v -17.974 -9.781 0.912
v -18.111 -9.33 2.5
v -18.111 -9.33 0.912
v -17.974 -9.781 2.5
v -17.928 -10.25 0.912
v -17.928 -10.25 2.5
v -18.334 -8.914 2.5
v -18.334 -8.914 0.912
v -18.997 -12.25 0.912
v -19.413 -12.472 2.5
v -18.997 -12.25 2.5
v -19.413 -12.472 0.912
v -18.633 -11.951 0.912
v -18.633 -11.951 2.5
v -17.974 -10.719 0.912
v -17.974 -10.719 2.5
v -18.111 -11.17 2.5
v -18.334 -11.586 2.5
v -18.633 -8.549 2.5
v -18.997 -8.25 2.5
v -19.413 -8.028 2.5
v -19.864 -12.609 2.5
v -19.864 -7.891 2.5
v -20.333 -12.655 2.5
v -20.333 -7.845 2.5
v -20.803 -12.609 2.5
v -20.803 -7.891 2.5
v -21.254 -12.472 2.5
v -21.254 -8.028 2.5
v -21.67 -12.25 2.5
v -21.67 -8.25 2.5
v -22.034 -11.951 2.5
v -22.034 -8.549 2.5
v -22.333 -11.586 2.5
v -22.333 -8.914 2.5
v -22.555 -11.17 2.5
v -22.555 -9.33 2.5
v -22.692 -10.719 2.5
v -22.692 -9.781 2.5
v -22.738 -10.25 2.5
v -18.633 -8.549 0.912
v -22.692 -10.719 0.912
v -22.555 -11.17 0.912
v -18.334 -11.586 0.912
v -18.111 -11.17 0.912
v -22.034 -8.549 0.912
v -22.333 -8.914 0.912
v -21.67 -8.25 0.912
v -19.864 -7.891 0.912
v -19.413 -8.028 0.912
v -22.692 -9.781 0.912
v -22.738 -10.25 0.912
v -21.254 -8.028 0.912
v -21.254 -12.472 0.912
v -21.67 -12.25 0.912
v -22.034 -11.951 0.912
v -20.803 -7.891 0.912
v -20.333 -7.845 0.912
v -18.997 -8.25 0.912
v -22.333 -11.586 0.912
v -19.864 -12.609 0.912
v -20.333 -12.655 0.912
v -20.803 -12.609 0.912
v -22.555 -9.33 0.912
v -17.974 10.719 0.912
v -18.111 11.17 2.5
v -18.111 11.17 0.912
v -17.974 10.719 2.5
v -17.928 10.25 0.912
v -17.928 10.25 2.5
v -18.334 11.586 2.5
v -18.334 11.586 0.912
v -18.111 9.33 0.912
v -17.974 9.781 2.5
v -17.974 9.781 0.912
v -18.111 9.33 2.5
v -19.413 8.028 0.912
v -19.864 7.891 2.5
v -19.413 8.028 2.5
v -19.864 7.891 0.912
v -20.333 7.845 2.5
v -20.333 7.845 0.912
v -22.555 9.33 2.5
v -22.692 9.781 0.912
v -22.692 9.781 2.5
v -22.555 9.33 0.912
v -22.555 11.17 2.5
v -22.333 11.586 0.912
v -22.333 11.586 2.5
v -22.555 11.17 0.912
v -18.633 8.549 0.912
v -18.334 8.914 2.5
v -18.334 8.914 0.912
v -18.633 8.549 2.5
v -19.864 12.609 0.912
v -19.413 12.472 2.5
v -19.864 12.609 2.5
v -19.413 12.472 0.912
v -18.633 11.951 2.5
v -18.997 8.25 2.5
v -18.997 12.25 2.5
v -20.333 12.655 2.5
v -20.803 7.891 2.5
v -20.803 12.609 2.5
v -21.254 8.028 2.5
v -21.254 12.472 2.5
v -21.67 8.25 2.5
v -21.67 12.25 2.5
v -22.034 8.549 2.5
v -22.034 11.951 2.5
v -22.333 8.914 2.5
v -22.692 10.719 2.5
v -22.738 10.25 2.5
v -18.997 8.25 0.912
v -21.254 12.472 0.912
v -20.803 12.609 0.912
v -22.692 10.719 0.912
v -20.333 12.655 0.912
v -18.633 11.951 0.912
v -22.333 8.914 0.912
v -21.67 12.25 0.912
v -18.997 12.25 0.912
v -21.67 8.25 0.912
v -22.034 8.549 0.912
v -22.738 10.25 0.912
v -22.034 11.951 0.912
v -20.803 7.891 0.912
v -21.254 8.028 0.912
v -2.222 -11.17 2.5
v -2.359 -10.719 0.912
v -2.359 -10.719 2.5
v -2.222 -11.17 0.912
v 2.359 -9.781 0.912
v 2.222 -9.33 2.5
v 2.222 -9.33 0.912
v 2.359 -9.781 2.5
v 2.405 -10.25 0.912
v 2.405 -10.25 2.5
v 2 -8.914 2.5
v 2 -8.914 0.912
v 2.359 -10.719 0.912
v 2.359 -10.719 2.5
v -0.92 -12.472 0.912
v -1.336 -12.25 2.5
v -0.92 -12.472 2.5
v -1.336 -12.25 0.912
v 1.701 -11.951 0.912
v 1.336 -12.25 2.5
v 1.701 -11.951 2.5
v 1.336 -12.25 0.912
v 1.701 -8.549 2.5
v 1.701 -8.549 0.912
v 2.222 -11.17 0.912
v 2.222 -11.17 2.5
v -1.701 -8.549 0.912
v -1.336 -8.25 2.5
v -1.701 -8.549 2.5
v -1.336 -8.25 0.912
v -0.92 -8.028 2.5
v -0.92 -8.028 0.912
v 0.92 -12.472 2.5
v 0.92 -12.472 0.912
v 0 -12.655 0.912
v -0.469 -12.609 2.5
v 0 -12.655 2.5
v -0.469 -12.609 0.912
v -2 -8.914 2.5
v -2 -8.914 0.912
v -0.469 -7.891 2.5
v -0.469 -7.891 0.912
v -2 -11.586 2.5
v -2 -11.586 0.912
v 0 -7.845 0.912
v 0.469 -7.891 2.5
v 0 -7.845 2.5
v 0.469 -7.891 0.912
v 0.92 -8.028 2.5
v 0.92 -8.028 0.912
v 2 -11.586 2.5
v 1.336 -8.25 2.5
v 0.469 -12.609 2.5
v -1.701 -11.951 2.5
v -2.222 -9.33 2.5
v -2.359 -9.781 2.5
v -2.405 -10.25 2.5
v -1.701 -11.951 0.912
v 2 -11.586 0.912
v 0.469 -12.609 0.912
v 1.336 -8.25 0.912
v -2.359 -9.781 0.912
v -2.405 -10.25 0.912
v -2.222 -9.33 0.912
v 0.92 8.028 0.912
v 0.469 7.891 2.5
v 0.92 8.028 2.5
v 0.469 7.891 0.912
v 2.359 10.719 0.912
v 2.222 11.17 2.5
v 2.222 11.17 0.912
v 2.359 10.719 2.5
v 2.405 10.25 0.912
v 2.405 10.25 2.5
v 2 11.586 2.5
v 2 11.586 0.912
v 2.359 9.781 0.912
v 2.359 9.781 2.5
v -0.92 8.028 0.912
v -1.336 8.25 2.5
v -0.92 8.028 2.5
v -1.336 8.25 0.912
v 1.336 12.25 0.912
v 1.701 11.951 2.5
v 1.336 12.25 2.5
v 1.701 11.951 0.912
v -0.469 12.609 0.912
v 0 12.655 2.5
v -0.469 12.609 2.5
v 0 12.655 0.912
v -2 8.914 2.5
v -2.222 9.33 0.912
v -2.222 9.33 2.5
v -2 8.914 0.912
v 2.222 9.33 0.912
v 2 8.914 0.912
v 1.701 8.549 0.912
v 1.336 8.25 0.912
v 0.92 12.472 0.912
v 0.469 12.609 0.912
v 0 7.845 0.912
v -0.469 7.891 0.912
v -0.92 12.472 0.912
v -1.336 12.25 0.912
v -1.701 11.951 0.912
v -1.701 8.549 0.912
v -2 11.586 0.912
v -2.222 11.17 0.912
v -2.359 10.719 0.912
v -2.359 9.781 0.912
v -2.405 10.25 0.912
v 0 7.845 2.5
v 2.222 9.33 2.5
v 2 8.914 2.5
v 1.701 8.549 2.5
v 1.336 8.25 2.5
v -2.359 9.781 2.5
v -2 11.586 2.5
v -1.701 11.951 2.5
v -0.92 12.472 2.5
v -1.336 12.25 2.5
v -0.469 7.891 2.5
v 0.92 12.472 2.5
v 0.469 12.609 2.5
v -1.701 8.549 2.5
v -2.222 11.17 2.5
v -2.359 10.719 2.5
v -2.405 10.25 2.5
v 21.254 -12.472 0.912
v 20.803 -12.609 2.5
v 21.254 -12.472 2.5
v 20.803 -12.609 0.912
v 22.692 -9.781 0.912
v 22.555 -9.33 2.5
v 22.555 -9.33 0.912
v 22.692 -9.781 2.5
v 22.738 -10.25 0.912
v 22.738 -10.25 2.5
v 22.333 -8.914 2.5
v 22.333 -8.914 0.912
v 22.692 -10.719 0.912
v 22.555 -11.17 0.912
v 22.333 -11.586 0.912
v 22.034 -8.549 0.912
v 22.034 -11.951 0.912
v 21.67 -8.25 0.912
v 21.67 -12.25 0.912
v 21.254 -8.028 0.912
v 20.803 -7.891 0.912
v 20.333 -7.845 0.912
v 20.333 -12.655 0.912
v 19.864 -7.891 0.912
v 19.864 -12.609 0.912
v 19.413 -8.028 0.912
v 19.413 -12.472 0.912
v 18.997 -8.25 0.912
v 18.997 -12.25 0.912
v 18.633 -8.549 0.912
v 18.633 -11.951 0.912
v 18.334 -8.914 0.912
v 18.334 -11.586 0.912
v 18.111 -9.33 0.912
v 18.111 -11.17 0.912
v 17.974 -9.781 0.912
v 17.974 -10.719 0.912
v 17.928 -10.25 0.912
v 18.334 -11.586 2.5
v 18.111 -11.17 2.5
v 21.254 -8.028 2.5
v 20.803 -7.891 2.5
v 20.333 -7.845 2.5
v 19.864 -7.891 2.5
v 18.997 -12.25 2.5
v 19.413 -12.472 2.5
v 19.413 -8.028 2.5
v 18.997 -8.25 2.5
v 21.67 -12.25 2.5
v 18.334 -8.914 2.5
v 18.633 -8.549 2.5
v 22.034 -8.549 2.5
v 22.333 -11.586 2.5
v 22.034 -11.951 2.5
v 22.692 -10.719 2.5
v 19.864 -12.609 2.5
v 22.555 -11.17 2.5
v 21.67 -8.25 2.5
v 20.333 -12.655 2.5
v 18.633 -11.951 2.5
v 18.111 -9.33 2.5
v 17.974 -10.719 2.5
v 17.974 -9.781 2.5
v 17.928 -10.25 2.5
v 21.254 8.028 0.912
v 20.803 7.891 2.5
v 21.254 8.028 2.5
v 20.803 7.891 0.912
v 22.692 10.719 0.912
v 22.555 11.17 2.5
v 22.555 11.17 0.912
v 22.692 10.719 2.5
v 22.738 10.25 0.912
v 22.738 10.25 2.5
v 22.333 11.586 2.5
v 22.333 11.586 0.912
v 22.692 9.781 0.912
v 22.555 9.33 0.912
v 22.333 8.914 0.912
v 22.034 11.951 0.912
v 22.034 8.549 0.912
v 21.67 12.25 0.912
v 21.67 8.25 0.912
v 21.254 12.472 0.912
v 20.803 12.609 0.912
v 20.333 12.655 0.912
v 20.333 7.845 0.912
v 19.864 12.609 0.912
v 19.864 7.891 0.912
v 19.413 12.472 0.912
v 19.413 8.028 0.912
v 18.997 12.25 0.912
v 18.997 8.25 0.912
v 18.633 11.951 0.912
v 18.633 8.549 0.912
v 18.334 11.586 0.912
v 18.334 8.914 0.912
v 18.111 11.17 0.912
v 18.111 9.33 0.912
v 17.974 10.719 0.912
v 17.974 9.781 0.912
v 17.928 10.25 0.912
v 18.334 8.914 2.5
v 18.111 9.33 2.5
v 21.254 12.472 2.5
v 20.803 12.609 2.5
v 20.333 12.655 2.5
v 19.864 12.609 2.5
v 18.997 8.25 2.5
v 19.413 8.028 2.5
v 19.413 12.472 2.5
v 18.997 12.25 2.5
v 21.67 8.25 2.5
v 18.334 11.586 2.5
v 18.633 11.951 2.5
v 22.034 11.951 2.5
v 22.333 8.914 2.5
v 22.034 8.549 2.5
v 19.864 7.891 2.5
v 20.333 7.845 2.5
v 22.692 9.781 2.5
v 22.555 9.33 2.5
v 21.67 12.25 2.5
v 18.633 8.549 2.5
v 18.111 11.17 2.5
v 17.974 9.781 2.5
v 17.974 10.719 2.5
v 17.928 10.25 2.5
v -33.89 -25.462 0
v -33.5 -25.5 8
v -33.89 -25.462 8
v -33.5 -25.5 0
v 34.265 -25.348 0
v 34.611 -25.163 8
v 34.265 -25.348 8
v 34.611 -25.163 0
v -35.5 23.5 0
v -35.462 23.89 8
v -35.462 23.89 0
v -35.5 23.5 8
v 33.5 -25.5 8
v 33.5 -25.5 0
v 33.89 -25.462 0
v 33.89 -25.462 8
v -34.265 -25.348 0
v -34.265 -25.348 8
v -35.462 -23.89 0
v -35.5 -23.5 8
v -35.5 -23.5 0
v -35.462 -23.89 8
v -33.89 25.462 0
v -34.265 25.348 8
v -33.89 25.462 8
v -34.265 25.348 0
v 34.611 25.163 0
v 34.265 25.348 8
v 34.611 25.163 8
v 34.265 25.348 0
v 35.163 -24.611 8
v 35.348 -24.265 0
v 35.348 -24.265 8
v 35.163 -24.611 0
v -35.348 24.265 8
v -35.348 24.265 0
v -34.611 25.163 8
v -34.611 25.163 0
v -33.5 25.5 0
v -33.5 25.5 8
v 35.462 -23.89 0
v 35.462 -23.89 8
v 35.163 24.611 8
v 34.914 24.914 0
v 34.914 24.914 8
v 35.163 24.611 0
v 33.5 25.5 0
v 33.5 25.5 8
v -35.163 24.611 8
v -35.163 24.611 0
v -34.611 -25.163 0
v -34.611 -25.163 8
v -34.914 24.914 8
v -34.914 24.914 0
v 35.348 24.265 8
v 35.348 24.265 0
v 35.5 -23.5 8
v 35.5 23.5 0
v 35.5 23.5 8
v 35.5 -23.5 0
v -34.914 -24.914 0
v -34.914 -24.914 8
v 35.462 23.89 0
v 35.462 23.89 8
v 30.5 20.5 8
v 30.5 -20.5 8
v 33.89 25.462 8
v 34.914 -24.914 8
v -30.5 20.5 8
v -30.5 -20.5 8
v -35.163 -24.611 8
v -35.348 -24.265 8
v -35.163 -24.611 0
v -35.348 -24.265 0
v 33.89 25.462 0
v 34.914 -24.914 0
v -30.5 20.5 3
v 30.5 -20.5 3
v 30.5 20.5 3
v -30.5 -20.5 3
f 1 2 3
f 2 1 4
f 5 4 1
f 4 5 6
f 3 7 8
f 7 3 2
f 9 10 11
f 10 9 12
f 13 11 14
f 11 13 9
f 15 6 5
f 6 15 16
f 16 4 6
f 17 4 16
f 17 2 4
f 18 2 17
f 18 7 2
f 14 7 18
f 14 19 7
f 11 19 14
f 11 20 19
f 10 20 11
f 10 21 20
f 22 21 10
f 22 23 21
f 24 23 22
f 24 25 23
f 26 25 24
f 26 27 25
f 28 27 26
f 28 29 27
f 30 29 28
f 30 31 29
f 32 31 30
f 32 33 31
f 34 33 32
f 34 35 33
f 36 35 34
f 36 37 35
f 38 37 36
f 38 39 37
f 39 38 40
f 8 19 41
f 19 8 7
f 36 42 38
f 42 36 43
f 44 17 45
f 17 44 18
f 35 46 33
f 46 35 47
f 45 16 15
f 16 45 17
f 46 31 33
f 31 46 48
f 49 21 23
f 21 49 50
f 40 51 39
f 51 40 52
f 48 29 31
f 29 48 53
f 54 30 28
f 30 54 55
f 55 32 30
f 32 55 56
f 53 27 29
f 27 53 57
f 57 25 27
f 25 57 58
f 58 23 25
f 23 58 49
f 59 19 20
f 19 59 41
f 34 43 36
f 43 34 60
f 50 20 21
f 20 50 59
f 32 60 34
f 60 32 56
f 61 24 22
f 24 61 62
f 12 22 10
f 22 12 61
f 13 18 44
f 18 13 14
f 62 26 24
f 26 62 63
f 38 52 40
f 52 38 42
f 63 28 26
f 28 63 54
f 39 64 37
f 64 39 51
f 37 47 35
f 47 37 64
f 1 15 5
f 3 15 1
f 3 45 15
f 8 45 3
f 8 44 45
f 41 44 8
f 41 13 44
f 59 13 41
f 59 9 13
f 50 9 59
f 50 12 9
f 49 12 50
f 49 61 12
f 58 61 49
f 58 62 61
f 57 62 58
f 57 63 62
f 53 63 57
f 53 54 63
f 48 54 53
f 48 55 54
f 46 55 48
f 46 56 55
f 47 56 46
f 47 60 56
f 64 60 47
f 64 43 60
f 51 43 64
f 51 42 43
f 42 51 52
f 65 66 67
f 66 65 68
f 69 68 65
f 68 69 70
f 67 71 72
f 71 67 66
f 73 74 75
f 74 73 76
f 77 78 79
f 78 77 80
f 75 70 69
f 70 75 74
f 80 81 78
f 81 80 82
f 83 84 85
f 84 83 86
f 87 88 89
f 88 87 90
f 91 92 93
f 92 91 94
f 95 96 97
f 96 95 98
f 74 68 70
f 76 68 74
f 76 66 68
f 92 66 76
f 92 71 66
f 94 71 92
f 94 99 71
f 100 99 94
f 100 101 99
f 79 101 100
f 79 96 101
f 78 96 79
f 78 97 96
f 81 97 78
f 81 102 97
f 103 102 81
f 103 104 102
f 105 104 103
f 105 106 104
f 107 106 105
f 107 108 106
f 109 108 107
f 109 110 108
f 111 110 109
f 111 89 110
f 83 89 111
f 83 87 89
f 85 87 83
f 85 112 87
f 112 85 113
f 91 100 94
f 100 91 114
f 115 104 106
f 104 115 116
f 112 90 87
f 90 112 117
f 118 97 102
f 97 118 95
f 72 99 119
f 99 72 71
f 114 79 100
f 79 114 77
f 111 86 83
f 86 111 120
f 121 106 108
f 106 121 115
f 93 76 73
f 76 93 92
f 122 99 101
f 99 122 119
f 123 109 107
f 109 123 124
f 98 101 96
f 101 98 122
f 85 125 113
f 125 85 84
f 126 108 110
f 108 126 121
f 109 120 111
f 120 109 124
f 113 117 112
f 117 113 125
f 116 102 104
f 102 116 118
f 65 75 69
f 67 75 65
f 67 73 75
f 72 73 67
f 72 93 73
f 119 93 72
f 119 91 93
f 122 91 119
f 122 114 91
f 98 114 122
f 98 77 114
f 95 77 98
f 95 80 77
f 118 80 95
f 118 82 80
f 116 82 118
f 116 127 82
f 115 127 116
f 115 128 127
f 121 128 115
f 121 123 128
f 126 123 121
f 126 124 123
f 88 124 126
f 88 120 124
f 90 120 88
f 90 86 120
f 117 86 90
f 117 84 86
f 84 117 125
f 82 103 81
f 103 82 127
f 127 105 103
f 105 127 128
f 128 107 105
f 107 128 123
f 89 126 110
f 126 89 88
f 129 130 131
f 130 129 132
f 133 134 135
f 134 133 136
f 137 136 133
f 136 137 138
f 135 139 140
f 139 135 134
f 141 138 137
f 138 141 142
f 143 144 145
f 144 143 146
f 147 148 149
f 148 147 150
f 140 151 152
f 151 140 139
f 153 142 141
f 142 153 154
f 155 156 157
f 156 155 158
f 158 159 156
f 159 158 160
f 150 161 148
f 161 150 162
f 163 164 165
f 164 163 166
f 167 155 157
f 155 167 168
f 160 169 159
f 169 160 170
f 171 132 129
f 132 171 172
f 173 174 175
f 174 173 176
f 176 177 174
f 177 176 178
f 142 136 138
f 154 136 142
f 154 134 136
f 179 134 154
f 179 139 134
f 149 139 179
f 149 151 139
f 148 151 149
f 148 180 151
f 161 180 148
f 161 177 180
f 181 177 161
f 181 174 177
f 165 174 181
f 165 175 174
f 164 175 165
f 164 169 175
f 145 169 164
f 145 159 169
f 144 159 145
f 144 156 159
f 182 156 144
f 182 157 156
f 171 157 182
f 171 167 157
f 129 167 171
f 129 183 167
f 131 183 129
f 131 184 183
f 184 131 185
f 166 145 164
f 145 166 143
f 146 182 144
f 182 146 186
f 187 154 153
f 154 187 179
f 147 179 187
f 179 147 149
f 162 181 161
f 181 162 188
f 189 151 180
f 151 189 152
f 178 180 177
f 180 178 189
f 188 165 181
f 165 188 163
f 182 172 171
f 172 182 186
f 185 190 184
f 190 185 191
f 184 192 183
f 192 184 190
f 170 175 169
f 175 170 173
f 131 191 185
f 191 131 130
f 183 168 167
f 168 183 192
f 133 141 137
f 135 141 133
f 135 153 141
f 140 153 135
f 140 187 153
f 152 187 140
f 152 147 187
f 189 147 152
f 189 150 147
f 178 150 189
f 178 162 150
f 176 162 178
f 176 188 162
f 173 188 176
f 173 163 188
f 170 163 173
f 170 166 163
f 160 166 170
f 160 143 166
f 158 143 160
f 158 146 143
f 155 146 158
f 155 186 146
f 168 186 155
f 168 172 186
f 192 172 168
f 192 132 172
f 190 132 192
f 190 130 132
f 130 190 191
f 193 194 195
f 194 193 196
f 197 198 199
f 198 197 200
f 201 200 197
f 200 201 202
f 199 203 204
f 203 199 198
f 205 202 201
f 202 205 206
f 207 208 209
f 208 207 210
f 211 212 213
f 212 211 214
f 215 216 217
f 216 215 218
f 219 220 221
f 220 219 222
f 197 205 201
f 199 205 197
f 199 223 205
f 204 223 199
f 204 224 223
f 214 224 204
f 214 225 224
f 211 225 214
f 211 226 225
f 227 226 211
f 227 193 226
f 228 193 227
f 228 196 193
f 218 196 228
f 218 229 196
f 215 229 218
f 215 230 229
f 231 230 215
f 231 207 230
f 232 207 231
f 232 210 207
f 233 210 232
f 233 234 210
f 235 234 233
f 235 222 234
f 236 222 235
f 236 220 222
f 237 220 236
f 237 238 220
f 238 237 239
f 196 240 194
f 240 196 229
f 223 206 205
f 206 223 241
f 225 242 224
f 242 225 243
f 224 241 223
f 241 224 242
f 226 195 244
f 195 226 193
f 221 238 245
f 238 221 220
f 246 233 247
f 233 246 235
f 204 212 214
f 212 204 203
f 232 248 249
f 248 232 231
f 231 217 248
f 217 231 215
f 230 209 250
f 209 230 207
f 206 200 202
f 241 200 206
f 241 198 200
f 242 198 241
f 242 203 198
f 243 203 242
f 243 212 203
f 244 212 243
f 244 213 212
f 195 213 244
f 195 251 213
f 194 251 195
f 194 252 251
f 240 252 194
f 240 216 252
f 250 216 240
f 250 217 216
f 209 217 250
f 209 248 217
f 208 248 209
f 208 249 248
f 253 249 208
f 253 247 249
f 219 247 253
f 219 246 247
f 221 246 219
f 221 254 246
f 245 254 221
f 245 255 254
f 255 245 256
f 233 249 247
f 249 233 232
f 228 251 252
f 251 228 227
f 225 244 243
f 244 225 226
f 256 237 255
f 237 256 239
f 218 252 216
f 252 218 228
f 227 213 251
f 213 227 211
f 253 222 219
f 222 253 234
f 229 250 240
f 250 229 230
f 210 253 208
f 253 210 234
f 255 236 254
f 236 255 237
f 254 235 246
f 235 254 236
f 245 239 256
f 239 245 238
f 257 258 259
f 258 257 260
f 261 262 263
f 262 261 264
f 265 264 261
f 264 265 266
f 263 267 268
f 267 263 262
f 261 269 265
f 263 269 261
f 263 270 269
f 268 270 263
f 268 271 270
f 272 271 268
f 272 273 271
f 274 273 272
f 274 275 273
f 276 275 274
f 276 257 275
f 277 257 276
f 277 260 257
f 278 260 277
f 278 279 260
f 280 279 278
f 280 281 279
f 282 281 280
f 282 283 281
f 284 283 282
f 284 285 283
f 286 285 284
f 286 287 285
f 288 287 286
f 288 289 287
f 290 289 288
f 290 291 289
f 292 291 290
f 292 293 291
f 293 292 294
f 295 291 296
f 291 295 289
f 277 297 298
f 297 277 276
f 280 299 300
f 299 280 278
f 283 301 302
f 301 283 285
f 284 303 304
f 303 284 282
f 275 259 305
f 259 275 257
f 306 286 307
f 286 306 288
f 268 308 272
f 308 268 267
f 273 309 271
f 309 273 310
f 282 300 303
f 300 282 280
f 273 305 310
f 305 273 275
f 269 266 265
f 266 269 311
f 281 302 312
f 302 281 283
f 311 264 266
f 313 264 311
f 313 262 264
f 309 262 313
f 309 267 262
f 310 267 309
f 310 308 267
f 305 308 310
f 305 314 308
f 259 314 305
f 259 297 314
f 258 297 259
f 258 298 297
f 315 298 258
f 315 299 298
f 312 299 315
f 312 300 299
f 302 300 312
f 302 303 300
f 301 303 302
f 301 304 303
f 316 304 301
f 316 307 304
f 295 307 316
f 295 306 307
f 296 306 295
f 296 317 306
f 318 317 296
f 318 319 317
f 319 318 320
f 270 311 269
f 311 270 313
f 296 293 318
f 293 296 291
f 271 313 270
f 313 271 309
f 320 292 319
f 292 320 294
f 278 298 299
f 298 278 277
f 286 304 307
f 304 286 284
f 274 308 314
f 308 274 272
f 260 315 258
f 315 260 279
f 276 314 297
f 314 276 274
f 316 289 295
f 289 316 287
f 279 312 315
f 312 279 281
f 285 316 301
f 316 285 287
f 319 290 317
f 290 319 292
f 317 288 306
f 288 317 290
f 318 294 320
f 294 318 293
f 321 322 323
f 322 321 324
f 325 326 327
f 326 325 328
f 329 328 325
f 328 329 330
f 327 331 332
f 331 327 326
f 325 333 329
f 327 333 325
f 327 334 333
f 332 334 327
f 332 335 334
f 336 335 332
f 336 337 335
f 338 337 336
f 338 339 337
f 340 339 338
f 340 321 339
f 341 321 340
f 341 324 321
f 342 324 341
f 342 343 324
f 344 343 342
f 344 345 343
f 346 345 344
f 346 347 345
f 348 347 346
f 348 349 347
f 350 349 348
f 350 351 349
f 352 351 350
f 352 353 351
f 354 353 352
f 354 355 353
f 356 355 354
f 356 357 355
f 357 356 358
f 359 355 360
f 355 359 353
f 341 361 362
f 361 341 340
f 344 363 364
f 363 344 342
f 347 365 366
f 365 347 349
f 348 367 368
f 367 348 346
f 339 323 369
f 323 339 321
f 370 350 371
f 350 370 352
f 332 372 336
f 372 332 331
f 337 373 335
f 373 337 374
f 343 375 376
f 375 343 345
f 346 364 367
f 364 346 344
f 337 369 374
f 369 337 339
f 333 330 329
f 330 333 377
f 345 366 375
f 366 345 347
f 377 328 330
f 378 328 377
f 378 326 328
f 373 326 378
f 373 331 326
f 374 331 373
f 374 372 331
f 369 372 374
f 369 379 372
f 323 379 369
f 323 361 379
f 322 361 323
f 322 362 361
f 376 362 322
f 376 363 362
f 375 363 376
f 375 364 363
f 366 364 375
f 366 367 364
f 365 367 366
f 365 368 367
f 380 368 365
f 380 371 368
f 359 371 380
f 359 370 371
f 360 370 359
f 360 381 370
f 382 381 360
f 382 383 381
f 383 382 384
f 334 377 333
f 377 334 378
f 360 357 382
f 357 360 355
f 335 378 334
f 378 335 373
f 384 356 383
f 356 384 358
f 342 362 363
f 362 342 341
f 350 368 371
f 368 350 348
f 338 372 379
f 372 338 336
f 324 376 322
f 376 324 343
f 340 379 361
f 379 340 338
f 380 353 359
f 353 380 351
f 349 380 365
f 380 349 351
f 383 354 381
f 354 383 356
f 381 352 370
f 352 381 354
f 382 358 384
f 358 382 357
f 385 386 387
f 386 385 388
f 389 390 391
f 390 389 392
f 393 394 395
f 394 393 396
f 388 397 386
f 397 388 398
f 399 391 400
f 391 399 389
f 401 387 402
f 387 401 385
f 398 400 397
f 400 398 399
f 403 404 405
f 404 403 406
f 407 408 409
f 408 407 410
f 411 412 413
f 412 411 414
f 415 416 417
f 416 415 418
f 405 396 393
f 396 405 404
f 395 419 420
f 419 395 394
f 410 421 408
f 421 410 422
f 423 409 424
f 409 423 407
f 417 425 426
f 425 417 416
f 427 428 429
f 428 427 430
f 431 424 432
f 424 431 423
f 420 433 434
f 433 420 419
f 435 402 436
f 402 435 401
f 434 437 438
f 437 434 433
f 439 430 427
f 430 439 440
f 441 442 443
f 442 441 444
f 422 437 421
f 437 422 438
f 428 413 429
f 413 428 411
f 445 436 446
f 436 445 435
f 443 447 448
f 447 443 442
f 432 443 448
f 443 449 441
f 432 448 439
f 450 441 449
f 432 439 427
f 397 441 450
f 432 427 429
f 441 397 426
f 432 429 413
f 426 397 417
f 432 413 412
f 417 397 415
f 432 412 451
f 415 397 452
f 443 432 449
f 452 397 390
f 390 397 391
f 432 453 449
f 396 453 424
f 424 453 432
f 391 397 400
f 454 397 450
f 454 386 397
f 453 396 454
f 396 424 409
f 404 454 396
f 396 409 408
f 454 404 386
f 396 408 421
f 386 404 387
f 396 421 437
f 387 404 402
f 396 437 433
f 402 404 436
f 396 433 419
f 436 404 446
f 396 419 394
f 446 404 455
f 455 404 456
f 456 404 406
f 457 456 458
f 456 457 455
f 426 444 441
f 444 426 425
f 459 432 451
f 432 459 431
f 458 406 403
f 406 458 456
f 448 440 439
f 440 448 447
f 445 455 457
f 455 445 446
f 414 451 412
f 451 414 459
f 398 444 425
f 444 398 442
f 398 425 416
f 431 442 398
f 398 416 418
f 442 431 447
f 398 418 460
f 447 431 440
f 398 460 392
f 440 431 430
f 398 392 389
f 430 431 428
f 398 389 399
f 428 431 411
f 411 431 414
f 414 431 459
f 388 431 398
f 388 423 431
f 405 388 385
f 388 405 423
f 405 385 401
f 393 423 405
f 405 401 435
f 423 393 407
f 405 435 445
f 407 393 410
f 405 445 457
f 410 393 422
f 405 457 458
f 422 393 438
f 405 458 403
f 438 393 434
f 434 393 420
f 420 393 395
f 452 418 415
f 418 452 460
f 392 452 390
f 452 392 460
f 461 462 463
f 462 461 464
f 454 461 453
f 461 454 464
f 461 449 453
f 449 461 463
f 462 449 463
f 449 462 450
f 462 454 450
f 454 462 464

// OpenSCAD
$fn = 32;
// Parameters
slider_size = 20;        // mm
sliders_x = 3;           // count
sliders_y = 2;           // count
tolerance = 1;           // mm (for the total space)
base_height = 3;         // mm
wall_height = 5;         // mm
wall_thickness = 5;      // mm
magnet_height = 1/16 * 25.4; // inch to mm conversion
magnet_radius = 3/16 * 25.4 * 1/2 * 1.01; // inch to mm conversion
magnet_offset = 0.5;     // mm
fillet_radius = 2;       // Fillet radius for outer corners

// Helper function to calculate total width and height
grid_width = sliders_x * slider_size + tolerance;
grid_height = sliders_y * slider_size + tolerance;
magnet_spacing_x = slider_size + tolerance/sliders_x; // Adjust magnet spacing with tolerance
magnet_spacing_y = slider_size + tolerance/sliders_y;

// Magnet Grid Module
module magnet_grid() {
    for (x = [0:sliders_x-1]) {
        for (y = [0:sliders_y-1]) {
            // Position magnets in grid with adjusted spacing and center the whole grid
            translate([x * magnet_spacing_x - (grid_width / 2) + magnet_spacing_x / 2, 
                       y * magnet_spacing_y - (grid_height / 2) + magnet_spacing_y / 2,
                       base_height - magnet_offset - magnet_height])
                cylinder(h=magnet_height, r=magnet_radius);
        }
    }
}

// Main difference block
difference() {
    // Outer structure with walls and filleted corners
    linear_extrude(base_height + wall_height)
        offset(r=fillet_radius)  // Apply fillet to outer corners
            square([grid_width + 2 * wall_thickness - 2*fillet_radius, grid_height + 2 * wall_thickness - 2*fillet_radius], center = true);
    
    // Inner cut-out for the top part (no fillet here)
    translate([0, 0, base_height])
        linear_extrude(1.1 * wall_height)
            square([grid_width, grid_height], center = true);
    
    // Magnet grid recessed in the base
    magnet_grid();
}
